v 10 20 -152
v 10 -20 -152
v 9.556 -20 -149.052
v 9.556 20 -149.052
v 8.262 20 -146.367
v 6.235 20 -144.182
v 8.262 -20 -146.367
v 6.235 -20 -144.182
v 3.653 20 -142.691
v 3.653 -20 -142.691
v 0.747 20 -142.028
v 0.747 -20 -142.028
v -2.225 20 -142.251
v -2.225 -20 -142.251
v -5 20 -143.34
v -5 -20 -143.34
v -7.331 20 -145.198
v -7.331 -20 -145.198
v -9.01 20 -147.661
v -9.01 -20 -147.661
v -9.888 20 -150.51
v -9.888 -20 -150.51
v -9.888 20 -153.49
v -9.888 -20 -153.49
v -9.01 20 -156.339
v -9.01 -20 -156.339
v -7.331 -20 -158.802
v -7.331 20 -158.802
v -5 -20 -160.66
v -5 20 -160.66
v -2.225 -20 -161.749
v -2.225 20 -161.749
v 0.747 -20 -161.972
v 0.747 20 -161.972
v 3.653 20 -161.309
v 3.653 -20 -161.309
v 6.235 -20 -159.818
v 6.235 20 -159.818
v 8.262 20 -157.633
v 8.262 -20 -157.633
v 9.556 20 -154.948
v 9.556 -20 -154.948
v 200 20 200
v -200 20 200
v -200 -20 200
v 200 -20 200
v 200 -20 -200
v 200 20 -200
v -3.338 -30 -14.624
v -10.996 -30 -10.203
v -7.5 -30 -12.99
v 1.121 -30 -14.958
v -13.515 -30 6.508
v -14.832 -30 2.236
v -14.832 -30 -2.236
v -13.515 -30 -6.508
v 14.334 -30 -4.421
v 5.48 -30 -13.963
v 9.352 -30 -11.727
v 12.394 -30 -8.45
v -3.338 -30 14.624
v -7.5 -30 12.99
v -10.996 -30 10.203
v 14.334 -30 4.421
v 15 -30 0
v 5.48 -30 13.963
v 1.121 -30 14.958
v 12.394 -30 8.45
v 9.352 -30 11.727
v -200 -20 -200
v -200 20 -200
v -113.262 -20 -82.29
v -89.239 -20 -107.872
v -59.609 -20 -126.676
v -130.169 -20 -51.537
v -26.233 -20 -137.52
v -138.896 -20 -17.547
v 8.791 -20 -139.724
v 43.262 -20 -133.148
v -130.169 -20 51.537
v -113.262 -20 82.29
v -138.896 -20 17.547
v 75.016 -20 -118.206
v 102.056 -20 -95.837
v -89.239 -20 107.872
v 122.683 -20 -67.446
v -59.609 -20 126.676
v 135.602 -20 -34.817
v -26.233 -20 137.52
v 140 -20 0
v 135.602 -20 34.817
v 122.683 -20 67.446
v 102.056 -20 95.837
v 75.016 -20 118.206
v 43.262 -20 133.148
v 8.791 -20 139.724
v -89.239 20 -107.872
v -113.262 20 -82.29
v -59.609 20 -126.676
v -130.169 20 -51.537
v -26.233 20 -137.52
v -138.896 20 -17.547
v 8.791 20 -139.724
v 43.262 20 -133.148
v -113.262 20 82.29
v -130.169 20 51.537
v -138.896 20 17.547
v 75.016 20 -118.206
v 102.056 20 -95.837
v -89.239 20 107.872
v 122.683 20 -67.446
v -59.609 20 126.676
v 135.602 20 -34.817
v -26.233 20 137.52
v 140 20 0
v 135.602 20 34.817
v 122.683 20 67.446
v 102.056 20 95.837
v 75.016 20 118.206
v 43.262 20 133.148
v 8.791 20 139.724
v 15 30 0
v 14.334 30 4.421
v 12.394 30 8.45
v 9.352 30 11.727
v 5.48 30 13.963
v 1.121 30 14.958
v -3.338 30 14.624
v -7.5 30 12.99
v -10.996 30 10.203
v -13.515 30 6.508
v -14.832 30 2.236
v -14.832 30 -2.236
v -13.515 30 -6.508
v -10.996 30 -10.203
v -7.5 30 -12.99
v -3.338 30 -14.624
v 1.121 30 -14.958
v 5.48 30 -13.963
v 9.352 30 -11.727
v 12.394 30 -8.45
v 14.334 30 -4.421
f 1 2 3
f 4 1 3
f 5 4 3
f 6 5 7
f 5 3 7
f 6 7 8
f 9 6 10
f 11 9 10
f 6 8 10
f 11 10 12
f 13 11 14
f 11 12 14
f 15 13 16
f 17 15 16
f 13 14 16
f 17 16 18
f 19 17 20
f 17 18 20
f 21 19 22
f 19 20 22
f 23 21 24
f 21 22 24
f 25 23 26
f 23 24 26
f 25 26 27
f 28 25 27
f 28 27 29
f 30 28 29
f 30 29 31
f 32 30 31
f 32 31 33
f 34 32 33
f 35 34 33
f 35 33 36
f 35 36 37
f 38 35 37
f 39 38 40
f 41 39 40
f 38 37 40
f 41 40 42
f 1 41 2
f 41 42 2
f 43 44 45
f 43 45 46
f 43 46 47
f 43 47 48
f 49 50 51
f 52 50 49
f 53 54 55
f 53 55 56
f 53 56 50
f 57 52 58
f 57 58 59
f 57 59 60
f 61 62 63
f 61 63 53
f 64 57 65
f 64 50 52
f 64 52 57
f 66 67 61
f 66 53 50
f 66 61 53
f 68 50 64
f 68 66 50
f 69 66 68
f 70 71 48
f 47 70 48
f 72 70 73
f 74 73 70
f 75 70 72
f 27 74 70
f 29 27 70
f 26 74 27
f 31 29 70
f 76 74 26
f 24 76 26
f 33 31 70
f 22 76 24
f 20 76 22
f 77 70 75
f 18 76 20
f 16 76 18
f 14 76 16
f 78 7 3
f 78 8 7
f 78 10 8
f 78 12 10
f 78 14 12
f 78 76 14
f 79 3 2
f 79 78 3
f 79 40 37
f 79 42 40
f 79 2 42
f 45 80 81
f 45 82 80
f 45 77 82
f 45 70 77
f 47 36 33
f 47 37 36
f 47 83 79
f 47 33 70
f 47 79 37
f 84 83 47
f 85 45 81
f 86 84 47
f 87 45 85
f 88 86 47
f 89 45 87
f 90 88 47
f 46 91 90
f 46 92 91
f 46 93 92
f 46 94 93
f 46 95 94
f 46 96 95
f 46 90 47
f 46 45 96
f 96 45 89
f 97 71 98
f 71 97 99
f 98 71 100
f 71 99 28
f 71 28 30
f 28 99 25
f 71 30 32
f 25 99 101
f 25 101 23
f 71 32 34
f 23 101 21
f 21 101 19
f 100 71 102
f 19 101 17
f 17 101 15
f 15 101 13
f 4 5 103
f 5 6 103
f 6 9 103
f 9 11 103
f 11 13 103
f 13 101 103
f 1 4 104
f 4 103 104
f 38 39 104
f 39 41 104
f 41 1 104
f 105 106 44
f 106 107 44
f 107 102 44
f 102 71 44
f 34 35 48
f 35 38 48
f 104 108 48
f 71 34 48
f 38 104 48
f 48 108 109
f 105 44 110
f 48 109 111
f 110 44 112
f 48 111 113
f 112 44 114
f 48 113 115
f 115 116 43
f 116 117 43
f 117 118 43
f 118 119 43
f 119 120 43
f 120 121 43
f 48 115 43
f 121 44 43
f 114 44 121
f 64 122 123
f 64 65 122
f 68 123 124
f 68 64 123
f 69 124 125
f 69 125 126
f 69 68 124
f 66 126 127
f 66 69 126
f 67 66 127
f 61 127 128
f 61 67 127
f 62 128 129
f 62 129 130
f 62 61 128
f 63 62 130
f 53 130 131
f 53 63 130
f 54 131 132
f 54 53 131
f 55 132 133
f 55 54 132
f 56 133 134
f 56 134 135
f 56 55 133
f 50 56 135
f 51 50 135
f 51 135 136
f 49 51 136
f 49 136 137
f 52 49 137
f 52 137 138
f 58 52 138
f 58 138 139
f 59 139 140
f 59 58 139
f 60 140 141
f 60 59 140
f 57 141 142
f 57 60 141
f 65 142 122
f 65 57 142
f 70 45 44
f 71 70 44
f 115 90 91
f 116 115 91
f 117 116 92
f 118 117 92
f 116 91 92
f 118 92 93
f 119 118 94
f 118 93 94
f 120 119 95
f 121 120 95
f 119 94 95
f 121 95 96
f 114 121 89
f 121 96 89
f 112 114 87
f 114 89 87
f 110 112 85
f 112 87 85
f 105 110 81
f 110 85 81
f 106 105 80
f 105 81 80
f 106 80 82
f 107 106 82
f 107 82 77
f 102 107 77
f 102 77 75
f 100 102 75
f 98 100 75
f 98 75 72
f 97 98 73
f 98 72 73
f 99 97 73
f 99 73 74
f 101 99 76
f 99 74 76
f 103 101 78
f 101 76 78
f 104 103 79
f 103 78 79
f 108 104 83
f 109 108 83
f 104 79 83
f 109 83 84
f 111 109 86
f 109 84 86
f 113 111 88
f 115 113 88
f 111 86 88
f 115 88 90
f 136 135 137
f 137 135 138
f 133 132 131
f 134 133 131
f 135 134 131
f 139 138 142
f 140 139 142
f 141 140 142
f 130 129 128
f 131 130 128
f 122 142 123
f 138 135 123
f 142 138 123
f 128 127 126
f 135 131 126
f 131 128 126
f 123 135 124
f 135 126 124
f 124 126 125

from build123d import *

# Parameters (mm, degrees)
F0_W          = 400
F0_H          = 40
F1_DEPTH      = 200
F1_DEPTH_BACK = 200
F2_R          = 140
F3_DEPTH      = 40
F4_R          = 15
F5_DEPTH      = 30
F5_DEPTH_BACK = 30
F6_R          = 10
F7_DEPTH      = 40


with BuildPart() as f1:
    # F0 (on Top) → F1 (new body, two sides)
    with BuildSketch(Plane.XY) as f1_sk:
        Rectangle(F0_W, F0_H)
    extrude(amount=F1_DEPTH)
    extrude(f1_sk.sketch, amount=-F1_DEPTH_BACK)

    # F2 (on face) → F3 (cut)
    with BuildSketch(Plane.XZ.offset(20)):
        Circle(F2_R)
    extrude(amount=-F3_DEPTH, mode=Mode.SUBTRACT)

    # F6 (on face) → F7 (cut)
    with BuildSketch(Plane.XZ.offset(20)):
        with Locations((0, -152)):
            Circle(F6_R)
    extrude(amount=-F7_DEPTH, mode=Mode.SUBTRACT)


with BuildPart() as f5:
    # F4 (on Front) → F5 (new body, two sides)
    with BuildSketch(Plane.XZ) as f5_sk:
        Circle(F4_R)
    extrude(amount=F5_DEPTH)
    extrude(f5_sk.sketch, amount=-F5_DEPTH_BACK)


solid = Compound([f1.part, f5.part])
